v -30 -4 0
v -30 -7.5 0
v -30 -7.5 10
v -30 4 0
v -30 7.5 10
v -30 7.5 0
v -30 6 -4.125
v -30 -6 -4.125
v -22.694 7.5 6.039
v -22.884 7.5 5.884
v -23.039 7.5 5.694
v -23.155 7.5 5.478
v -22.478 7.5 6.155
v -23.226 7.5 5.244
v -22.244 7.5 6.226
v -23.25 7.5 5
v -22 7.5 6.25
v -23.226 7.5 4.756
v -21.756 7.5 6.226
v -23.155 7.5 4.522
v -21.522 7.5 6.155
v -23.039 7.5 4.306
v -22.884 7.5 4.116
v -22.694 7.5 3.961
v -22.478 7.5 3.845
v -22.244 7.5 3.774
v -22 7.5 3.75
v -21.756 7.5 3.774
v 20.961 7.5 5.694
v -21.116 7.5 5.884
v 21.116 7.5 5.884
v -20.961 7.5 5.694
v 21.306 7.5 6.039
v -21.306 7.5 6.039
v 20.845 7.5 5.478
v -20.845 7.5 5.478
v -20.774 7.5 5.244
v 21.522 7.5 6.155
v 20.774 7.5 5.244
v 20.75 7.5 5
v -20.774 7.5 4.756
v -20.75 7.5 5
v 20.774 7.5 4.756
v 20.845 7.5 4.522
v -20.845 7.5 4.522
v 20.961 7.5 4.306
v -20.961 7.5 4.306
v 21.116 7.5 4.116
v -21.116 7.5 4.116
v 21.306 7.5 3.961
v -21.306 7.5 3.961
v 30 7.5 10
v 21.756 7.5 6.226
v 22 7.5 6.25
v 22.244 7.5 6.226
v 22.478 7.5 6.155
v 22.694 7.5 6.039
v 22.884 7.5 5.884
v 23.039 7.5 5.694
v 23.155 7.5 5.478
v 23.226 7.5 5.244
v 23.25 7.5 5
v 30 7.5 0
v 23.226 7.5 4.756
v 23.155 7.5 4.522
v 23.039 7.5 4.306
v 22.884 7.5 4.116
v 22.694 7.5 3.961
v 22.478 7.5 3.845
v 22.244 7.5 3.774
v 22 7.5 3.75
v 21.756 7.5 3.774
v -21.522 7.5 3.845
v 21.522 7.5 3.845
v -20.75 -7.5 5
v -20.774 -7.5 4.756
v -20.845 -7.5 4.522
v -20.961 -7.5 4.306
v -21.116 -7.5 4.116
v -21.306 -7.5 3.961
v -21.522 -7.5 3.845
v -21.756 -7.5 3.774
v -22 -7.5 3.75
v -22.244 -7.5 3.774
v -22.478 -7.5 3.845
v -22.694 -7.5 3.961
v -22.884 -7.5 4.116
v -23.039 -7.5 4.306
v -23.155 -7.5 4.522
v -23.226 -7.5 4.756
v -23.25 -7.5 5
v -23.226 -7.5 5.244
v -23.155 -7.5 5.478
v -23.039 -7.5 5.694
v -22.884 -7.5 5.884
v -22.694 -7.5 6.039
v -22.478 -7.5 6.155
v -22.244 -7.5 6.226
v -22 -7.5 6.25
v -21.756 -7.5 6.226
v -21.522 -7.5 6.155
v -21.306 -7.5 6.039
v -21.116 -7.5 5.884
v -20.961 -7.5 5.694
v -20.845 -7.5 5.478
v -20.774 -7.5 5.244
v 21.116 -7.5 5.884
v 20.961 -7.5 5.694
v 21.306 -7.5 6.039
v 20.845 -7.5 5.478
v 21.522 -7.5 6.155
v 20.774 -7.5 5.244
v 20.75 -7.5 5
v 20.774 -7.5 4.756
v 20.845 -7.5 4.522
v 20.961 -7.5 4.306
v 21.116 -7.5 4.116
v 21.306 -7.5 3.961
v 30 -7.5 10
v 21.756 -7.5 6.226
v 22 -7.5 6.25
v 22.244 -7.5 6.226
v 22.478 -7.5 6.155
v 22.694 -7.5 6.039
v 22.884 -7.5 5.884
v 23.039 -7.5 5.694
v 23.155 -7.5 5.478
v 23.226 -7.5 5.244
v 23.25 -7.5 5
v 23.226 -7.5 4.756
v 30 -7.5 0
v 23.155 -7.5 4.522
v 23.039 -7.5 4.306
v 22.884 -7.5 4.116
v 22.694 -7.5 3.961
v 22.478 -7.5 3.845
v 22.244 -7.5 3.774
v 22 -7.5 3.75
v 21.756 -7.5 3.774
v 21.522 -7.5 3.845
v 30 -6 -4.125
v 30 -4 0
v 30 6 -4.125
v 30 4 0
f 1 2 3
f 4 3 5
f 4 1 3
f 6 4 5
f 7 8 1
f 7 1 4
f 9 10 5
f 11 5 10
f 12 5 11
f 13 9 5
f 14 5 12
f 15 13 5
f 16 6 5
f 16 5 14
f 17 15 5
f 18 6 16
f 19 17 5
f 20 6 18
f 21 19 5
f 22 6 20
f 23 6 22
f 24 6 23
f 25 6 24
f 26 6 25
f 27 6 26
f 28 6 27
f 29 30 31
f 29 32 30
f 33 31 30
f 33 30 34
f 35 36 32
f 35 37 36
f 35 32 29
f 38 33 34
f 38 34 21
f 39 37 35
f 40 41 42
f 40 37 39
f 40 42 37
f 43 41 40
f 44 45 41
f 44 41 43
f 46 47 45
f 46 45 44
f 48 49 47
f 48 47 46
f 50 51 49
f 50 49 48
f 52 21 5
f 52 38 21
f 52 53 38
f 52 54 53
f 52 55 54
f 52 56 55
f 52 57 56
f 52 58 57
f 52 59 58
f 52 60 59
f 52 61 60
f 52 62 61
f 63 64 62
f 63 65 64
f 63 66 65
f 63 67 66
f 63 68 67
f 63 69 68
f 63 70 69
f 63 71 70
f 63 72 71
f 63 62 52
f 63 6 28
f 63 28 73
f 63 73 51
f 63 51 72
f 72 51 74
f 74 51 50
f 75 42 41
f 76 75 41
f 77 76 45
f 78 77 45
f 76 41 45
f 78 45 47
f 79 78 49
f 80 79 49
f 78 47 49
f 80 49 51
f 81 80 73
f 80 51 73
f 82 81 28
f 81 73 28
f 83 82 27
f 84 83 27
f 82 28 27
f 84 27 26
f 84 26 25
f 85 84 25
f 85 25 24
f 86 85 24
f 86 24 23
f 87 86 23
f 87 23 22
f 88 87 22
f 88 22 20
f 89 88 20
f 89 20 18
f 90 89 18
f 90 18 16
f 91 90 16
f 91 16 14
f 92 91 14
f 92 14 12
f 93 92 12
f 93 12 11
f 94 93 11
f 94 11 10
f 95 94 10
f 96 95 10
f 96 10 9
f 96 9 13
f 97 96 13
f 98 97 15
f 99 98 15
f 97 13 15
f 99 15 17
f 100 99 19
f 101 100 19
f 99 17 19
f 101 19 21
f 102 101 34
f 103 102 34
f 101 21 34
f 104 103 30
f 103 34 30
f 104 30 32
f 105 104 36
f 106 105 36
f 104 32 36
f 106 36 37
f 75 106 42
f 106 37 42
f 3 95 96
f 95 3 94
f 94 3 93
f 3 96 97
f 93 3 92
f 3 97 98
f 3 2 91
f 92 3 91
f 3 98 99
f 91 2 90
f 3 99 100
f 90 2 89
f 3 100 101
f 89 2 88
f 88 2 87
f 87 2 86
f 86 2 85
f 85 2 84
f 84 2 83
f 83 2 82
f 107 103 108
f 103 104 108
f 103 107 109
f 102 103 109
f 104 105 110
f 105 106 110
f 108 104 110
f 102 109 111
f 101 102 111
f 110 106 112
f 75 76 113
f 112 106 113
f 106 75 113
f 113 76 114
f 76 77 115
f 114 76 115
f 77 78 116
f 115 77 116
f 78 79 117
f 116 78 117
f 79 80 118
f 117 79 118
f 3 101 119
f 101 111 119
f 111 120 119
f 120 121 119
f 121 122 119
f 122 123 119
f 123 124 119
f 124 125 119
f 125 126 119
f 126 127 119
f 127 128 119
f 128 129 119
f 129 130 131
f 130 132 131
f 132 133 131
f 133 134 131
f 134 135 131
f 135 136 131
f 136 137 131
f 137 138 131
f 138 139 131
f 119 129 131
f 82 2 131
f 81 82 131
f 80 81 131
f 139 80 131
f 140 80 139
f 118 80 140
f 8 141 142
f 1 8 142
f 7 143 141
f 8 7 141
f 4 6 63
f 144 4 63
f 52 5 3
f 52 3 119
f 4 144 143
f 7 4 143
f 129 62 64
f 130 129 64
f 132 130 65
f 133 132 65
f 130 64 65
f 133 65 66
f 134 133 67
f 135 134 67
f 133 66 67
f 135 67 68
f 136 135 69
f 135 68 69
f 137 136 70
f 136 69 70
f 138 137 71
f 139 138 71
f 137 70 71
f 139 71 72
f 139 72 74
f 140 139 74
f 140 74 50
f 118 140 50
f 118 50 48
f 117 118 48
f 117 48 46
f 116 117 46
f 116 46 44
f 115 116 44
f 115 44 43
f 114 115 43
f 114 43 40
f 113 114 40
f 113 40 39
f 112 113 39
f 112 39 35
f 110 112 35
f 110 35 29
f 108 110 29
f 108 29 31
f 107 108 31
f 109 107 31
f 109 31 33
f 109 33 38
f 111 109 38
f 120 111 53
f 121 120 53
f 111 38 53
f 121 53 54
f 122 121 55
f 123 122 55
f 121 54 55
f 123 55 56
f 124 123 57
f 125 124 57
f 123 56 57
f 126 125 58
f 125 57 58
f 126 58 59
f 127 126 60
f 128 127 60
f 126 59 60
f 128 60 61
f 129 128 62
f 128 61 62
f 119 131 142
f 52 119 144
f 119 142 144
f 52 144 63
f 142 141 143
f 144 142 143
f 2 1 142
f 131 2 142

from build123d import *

# Parameters (mm, degrees)
SKETCH1_W               = 60
SKETCH1_H               = 15
BOSS_EXTRUDE1_DEPTH     = 10
BOSS_EXTRUDE2_DEPTH     = 60
SKETCH3_R               = 1.25
CUT_EXTRUDE1_DEPTH      = 1
CUT_EXTRUDE1_DEPTH_BACK = 16


with BuildPart() as part:
    # Sketch1 → Boss-Extrude1 (new body)
    with BuildSketch(Plane.XY):
        Rectangle(SKETCH1_W, SKETCH1_H)
    extrude(amount=BOSS_EXTRUDE1_DEPTH)

    # Sketch2 → Boss-Extrude2 (add)
    with BuildSketch(Plane(origin=(30, 0, 0), x_dir=(0, 0, -1), z_dir=(1, 0, 0))):
        Polygon((0, 4), (4.124819933, 6), (4.124819933, -6), (0, -4), align=None)
    extrude(amount=-BOSS_EXTRUDE2_DEPTH)

    # Sketch3 → Cut-Extrude1 (cut, two sides)
    with BuildSketch(Plane(origin=(0, 7.5, 0), x_dir=(1, 0, 0), z_dir=(0, 1, 0))) as cut_extrude1_sk:
        with Locations((-22, -5)):
            Circle(SKETCH3_R)
        with Locations((22, -5)):
            Circle(SKETCH3_R)
    extrude(amount=CUT_EXTRUDE1_DEPTH, mode=Mode.SUBTRACT)
    extrude(cut_extrude1_sk.sketch, amount=-CUT_EXTRUDE1_DEPTH_BACK, mode=Mode.SUBTRACT)


solid = part.part
